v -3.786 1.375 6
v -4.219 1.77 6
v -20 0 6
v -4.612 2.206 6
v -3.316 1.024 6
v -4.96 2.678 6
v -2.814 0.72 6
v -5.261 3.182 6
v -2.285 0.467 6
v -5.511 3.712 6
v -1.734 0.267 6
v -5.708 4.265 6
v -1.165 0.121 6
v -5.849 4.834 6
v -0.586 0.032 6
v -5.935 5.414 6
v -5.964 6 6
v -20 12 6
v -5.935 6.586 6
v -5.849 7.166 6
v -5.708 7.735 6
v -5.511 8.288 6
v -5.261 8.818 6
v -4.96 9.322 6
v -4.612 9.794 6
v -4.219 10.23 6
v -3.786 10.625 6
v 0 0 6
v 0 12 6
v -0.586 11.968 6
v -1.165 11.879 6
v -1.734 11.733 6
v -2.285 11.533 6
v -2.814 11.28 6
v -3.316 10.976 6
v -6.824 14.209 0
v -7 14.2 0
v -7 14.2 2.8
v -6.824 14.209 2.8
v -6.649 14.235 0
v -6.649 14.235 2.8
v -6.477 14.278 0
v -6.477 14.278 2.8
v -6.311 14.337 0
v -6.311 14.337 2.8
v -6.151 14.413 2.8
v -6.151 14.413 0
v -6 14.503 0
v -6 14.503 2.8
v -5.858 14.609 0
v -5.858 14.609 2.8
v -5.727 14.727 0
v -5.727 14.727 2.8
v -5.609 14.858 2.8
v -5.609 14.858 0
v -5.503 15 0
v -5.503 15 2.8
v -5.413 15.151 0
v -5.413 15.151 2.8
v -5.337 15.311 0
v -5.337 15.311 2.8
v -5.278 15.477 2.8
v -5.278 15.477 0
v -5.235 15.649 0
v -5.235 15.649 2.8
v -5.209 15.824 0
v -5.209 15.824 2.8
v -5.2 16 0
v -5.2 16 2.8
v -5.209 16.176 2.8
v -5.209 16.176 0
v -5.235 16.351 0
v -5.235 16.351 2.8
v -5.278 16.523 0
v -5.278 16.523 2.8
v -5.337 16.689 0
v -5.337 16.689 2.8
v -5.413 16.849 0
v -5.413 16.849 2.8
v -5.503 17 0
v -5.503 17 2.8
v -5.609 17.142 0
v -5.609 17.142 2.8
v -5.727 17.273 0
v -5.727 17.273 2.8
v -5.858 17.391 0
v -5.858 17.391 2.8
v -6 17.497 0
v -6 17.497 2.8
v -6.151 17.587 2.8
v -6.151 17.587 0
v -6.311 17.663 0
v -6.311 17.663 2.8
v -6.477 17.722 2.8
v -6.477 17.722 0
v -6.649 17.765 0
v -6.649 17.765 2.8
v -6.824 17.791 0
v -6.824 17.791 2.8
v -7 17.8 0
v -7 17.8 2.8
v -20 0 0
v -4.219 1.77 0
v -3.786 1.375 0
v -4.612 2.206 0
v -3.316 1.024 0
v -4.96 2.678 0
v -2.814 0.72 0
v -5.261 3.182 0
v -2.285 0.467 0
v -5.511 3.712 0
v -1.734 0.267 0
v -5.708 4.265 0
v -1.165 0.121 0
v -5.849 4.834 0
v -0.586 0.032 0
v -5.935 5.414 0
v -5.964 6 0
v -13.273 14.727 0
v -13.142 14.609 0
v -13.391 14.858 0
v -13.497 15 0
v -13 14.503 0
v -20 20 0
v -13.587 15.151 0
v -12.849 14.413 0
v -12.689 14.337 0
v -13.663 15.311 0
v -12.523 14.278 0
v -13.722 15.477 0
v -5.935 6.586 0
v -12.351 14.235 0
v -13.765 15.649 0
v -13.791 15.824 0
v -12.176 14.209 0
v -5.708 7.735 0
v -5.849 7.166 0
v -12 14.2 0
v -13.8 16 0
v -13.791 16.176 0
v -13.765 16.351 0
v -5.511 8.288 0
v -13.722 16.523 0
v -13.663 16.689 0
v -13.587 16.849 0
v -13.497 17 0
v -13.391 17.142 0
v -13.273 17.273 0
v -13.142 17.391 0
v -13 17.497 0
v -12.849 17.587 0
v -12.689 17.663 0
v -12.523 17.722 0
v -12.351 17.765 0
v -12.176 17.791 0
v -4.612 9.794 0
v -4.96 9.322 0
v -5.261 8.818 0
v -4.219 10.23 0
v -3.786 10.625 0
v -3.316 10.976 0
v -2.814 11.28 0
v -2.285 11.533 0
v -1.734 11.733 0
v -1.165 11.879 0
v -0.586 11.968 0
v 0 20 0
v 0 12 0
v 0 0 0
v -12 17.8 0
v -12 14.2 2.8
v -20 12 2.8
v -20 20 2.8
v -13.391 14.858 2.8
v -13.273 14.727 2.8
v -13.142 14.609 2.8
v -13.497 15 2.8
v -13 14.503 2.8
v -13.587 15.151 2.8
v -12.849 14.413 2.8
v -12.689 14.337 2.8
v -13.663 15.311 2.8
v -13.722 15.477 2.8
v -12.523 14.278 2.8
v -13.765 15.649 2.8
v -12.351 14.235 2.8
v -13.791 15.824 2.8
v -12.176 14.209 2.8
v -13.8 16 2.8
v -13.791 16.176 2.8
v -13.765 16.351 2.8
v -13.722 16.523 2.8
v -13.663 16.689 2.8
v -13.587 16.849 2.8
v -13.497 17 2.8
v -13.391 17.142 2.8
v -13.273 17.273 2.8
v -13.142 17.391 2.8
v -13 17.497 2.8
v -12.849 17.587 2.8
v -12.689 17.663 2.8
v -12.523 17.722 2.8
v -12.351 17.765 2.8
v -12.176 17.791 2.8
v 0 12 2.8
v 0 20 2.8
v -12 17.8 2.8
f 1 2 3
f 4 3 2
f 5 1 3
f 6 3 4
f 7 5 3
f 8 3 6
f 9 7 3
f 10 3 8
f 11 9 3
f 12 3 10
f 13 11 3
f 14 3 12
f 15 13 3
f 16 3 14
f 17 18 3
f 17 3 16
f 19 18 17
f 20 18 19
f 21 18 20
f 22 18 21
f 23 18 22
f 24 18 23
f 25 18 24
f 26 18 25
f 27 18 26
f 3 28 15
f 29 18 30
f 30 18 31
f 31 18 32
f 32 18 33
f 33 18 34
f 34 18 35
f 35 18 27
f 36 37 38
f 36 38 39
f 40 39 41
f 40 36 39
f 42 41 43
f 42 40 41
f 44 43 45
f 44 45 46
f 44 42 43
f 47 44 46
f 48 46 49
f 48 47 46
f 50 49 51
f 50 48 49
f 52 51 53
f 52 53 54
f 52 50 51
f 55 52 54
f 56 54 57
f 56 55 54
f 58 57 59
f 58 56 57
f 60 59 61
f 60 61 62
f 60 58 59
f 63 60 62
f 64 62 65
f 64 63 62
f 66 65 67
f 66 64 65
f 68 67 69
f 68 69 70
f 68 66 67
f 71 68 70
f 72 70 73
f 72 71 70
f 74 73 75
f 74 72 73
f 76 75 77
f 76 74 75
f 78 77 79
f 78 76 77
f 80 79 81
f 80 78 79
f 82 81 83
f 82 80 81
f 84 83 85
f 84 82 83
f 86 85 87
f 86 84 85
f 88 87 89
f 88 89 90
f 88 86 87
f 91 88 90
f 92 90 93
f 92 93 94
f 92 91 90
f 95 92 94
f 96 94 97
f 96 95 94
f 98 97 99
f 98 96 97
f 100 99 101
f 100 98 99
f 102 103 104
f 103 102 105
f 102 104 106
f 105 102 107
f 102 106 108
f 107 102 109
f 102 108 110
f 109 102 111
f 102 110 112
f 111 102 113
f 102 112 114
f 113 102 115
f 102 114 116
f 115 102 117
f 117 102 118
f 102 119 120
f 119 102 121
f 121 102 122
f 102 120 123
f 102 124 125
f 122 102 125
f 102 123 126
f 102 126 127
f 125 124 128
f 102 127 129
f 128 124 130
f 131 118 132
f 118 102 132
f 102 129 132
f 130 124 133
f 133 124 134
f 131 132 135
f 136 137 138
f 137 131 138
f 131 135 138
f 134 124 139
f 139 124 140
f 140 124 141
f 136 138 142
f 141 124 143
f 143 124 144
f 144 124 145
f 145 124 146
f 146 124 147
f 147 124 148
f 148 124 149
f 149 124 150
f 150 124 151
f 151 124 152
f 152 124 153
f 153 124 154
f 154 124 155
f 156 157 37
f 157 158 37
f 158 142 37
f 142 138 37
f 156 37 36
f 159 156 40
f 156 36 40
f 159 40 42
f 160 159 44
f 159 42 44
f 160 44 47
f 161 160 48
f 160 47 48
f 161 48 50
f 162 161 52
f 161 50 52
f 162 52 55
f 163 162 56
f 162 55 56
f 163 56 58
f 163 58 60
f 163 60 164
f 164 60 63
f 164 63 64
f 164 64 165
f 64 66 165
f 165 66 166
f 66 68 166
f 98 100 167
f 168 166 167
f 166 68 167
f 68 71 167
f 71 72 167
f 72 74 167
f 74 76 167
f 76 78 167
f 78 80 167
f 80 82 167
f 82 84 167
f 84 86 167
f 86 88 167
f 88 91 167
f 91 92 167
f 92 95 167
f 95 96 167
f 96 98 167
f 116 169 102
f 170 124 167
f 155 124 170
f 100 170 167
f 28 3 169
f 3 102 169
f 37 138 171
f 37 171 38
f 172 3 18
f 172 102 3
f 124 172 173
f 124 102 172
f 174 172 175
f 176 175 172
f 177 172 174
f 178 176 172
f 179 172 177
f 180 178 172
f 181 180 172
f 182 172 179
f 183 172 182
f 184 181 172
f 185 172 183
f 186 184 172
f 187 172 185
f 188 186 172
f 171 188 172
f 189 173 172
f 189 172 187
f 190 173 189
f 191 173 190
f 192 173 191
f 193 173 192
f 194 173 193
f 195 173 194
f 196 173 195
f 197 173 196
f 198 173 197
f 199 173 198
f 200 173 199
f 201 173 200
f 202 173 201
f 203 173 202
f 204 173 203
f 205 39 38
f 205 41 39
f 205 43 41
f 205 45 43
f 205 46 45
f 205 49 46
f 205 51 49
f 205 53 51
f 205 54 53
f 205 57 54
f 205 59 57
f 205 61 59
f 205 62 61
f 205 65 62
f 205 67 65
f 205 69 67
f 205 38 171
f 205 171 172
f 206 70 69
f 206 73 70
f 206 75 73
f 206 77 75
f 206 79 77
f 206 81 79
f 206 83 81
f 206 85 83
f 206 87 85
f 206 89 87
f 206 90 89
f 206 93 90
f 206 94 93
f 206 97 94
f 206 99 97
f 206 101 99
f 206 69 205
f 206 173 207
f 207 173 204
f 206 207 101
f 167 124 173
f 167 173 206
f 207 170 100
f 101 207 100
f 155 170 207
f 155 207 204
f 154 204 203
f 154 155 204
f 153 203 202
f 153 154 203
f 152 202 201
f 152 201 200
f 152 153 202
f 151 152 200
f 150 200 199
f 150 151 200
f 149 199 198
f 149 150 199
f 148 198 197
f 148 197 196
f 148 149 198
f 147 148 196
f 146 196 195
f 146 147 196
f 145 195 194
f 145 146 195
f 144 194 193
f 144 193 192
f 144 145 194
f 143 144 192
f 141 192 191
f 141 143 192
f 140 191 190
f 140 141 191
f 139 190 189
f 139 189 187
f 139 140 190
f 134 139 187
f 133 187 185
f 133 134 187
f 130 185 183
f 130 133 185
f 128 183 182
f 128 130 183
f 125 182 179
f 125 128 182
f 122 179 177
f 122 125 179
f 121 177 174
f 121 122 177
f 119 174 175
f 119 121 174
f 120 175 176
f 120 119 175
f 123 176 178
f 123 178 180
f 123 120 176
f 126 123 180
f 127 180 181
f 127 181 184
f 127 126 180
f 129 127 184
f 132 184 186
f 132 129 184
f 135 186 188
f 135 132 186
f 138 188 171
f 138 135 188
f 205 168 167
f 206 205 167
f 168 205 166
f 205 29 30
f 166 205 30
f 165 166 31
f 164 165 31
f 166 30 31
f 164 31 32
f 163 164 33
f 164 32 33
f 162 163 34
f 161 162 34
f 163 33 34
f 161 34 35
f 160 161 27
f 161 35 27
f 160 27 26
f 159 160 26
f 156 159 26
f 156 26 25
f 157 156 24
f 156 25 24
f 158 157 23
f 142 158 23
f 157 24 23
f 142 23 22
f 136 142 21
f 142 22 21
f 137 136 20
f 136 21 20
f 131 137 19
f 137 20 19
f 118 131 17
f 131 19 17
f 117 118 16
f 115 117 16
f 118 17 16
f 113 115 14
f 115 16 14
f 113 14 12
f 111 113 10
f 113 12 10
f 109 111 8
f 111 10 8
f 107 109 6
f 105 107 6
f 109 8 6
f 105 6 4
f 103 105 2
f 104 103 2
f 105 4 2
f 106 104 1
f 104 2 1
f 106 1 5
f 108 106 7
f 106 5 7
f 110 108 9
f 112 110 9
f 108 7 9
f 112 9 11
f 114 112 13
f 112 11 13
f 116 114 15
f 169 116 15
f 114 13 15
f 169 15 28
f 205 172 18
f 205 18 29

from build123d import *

# Parameters (mm, degrees)
SKETCH_W     = 20
SKETCH_H     = 20
PAD_DEPTH    = 2.8
SKETCH003_W  = 20
SKETCH003_H  = 12
PAD001_DEPTH = 3.2
POCKET_DEPTH = 10


with BuildPart() as part:
    # Sketch → Pad (new body)
    with BuildSketch(Plane.XY):
        with Locations((-10, 10)):
            Rectangle(SKETCH_W, SKETCH_H)
        with BuildLine():
            ThreePointArc((-12, 17.8), (-13.8, 16), (-12, 14.2))
            Line((-12, 14.2), (-7, 14.2))
            ThreePointArc((-7, 14.2), (-5.2, 16), (-7, 17.8))
            Line((-12, 17.8), (-7, 17.8))
        make_face(mode=Mode.SUBTRACT)
    extrude(amount=PAD_DEPTH)

    # Sketch003 → Pad001 (new body)
    with BuildSketch(Plane.XY.offset(2.8)):
        with Locations((-10, 6)):
            Rectangle(SKETCH003_W, SKETCH003_H)
    extrude(amount=PAD001_DEPTH)

    # Sketch004 → Pocket (cut)
    with BuildSketch(Plane.XY.offset(6)):
        with BuildLine():
            Line((0, 12), (0, 0))
            ThreePointArc((0, 12), (-5.963908, 6), (0, 0))
        make_face()
    extrude(amount=-POCKET_DEPTH, mode=Mode.SUBTRACT)


solid = part.part
